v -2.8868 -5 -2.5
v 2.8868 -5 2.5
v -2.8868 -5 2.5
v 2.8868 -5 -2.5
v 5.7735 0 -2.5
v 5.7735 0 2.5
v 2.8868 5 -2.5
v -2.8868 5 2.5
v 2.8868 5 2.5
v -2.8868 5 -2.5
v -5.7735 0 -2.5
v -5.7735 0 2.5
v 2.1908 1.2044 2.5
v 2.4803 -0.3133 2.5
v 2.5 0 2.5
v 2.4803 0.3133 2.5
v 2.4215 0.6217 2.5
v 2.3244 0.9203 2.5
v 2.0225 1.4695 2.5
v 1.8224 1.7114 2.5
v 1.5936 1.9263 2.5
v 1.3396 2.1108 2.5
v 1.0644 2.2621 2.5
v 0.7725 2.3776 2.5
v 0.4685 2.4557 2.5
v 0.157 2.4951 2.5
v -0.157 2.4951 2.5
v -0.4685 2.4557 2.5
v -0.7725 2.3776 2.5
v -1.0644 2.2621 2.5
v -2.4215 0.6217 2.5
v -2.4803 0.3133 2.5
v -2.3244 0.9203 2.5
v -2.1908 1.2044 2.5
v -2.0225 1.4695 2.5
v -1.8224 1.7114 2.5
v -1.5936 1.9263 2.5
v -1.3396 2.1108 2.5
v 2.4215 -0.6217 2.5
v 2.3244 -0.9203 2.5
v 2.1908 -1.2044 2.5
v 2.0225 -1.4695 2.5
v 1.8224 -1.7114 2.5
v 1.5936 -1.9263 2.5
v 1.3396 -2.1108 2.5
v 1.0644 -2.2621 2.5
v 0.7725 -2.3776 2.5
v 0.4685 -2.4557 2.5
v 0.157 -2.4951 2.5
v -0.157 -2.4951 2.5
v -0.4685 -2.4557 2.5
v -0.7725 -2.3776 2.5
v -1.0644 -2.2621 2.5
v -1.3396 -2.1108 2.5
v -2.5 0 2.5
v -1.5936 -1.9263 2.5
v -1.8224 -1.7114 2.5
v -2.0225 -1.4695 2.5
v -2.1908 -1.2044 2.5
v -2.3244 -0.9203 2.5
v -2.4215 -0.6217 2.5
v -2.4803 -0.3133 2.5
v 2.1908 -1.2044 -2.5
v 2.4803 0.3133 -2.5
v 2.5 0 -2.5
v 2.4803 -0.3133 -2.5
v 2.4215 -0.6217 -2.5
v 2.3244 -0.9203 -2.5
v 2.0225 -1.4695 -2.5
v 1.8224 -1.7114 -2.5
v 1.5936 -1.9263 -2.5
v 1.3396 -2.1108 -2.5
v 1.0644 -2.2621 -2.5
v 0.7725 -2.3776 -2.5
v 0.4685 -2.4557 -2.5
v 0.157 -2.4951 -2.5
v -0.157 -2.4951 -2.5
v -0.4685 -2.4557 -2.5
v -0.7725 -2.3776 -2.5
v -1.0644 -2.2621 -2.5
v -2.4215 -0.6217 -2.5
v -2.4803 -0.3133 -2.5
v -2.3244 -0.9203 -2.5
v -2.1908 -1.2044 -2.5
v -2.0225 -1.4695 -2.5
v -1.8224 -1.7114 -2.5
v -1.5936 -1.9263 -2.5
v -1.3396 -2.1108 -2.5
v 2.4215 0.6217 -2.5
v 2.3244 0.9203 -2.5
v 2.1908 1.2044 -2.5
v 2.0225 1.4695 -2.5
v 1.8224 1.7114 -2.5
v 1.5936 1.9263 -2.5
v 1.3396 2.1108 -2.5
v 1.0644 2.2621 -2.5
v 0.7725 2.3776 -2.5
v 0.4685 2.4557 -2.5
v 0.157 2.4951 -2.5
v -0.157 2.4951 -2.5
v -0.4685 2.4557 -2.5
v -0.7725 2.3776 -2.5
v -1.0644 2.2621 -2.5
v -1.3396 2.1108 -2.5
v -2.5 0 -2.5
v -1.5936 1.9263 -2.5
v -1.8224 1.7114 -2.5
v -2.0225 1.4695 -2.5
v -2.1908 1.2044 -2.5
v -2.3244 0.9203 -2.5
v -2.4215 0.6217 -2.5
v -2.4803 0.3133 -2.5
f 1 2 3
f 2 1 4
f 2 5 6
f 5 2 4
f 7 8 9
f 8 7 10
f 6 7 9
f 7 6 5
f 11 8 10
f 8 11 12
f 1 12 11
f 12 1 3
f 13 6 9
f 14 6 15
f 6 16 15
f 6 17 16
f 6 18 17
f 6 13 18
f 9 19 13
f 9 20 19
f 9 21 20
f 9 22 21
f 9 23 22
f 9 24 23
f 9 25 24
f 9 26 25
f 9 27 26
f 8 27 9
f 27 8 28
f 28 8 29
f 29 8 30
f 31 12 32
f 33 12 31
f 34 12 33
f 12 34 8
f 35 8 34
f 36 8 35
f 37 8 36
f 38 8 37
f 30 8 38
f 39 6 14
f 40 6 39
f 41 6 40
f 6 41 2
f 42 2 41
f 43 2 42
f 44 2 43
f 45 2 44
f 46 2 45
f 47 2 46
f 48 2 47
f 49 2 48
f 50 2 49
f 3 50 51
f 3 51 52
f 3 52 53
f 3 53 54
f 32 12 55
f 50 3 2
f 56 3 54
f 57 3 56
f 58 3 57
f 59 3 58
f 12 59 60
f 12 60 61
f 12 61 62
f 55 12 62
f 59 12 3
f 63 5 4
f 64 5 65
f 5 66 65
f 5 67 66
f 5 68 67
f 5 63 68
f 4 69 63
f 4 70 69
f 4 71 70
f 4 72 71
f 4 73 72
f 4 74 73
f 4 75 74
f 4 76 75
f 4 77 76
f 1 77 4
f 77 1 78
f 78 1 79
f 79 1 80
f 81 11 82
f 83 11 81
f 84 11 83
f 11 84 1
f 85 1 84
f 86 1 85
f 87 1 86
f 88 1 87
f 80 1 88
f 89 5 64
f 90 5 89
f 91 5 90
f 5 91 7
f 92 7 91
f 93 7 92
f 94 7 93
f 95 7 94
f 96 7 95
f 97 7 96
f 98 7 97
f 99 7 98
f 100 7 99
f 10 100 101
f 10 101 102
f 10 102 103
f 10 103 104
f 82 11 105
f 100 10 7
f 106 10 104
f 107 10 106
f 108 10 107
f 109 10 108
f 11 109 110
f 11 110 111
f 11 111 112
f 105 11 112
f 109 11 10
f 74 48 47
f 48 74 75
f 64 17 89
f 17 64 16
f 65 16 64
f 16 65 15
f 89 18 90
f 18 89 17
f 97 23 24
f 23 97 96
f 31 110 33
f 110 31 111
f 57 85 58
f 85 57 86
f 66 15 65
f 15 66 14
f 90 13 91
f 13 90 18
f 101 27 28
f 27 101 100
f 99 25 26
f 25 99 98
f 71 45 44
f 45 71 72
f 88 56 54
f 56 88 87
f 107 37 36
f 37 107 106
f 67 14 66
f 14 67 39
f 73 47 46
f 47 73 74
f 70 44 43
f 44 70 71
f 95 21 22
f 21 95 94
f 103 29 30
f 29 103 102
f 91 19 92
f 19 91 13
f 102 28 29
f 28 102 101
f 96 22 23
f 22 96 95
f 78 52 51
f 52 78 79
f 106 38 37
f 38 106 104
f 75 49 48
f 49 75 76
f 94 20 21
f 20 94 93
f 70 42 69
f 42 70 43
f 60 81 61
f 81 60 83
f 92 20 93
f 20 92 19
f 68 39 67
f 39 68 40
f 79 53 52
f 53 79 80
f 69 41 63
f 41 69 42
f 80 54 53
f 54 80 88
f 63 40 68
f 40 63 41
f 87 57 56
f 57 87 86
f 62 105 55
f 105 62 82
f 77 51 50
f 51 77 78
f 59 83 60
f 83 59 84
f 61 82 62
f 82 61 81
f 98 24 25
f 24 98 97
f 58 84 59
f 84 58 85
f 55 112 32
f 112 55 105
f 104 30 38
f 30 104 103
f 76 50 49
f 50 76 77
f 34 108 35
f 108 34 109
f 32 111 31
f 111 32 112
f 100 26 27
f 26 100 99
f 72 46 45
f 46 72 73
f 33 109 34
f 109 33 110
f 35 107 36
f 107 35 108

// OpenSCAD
// Simple Hex Nut Model (No Threads)
//
// This script creates a single, manifold 3D model of a hex nut
// centered at the origin (0,0,0).

// --- Parameters ---

// Flat-to-flat width of the hexagon (mm)
nut_width = 10;

// Diameter of the central hole (mm)
hole_diameter = 5;

// Thickness (height) of the nut (mm)
nut_thickness = 5;

// --- Calculations ---

// OpenSCAD's cylinder function uses radius (center-to-vertex for polygons).
// We need to calculate this radius from the flat-to-flat width.
// Formula: width = 2 * radius * cos(30 degrees)
// Therefore: radius = width / (2 * cos(30))
hex_radius = nut_width / (2 * cos(30));

// --- Model Definition ---

// Use difference() to subtract the hole from the hexagonal prism.
difference() {
    // 1. Create the main hexagonal prism body.
    // Use cylinder() with $fn=6 to create a hexagon.
    // Center=true ensures it's centered vertically along the Z-axis.
    cylinder(h = nut_thickness, r = hex_radius, $fn = 6, center = true);

    // 2. Create the central hole cylinder to be subtracted.
    // Make the hole cylinder slightly taller than the nut thickness (epsilon)
    // to ensure a clean subtraction and avoid potential coincident face issues.
    // Center=true aligns it with the hexagonal prism.
    cylinder(h = nut_thickness + 0.02, d = hole_diameter, $fn = 50, center = true); // Use $fn for smoother hole
}

// End of script
